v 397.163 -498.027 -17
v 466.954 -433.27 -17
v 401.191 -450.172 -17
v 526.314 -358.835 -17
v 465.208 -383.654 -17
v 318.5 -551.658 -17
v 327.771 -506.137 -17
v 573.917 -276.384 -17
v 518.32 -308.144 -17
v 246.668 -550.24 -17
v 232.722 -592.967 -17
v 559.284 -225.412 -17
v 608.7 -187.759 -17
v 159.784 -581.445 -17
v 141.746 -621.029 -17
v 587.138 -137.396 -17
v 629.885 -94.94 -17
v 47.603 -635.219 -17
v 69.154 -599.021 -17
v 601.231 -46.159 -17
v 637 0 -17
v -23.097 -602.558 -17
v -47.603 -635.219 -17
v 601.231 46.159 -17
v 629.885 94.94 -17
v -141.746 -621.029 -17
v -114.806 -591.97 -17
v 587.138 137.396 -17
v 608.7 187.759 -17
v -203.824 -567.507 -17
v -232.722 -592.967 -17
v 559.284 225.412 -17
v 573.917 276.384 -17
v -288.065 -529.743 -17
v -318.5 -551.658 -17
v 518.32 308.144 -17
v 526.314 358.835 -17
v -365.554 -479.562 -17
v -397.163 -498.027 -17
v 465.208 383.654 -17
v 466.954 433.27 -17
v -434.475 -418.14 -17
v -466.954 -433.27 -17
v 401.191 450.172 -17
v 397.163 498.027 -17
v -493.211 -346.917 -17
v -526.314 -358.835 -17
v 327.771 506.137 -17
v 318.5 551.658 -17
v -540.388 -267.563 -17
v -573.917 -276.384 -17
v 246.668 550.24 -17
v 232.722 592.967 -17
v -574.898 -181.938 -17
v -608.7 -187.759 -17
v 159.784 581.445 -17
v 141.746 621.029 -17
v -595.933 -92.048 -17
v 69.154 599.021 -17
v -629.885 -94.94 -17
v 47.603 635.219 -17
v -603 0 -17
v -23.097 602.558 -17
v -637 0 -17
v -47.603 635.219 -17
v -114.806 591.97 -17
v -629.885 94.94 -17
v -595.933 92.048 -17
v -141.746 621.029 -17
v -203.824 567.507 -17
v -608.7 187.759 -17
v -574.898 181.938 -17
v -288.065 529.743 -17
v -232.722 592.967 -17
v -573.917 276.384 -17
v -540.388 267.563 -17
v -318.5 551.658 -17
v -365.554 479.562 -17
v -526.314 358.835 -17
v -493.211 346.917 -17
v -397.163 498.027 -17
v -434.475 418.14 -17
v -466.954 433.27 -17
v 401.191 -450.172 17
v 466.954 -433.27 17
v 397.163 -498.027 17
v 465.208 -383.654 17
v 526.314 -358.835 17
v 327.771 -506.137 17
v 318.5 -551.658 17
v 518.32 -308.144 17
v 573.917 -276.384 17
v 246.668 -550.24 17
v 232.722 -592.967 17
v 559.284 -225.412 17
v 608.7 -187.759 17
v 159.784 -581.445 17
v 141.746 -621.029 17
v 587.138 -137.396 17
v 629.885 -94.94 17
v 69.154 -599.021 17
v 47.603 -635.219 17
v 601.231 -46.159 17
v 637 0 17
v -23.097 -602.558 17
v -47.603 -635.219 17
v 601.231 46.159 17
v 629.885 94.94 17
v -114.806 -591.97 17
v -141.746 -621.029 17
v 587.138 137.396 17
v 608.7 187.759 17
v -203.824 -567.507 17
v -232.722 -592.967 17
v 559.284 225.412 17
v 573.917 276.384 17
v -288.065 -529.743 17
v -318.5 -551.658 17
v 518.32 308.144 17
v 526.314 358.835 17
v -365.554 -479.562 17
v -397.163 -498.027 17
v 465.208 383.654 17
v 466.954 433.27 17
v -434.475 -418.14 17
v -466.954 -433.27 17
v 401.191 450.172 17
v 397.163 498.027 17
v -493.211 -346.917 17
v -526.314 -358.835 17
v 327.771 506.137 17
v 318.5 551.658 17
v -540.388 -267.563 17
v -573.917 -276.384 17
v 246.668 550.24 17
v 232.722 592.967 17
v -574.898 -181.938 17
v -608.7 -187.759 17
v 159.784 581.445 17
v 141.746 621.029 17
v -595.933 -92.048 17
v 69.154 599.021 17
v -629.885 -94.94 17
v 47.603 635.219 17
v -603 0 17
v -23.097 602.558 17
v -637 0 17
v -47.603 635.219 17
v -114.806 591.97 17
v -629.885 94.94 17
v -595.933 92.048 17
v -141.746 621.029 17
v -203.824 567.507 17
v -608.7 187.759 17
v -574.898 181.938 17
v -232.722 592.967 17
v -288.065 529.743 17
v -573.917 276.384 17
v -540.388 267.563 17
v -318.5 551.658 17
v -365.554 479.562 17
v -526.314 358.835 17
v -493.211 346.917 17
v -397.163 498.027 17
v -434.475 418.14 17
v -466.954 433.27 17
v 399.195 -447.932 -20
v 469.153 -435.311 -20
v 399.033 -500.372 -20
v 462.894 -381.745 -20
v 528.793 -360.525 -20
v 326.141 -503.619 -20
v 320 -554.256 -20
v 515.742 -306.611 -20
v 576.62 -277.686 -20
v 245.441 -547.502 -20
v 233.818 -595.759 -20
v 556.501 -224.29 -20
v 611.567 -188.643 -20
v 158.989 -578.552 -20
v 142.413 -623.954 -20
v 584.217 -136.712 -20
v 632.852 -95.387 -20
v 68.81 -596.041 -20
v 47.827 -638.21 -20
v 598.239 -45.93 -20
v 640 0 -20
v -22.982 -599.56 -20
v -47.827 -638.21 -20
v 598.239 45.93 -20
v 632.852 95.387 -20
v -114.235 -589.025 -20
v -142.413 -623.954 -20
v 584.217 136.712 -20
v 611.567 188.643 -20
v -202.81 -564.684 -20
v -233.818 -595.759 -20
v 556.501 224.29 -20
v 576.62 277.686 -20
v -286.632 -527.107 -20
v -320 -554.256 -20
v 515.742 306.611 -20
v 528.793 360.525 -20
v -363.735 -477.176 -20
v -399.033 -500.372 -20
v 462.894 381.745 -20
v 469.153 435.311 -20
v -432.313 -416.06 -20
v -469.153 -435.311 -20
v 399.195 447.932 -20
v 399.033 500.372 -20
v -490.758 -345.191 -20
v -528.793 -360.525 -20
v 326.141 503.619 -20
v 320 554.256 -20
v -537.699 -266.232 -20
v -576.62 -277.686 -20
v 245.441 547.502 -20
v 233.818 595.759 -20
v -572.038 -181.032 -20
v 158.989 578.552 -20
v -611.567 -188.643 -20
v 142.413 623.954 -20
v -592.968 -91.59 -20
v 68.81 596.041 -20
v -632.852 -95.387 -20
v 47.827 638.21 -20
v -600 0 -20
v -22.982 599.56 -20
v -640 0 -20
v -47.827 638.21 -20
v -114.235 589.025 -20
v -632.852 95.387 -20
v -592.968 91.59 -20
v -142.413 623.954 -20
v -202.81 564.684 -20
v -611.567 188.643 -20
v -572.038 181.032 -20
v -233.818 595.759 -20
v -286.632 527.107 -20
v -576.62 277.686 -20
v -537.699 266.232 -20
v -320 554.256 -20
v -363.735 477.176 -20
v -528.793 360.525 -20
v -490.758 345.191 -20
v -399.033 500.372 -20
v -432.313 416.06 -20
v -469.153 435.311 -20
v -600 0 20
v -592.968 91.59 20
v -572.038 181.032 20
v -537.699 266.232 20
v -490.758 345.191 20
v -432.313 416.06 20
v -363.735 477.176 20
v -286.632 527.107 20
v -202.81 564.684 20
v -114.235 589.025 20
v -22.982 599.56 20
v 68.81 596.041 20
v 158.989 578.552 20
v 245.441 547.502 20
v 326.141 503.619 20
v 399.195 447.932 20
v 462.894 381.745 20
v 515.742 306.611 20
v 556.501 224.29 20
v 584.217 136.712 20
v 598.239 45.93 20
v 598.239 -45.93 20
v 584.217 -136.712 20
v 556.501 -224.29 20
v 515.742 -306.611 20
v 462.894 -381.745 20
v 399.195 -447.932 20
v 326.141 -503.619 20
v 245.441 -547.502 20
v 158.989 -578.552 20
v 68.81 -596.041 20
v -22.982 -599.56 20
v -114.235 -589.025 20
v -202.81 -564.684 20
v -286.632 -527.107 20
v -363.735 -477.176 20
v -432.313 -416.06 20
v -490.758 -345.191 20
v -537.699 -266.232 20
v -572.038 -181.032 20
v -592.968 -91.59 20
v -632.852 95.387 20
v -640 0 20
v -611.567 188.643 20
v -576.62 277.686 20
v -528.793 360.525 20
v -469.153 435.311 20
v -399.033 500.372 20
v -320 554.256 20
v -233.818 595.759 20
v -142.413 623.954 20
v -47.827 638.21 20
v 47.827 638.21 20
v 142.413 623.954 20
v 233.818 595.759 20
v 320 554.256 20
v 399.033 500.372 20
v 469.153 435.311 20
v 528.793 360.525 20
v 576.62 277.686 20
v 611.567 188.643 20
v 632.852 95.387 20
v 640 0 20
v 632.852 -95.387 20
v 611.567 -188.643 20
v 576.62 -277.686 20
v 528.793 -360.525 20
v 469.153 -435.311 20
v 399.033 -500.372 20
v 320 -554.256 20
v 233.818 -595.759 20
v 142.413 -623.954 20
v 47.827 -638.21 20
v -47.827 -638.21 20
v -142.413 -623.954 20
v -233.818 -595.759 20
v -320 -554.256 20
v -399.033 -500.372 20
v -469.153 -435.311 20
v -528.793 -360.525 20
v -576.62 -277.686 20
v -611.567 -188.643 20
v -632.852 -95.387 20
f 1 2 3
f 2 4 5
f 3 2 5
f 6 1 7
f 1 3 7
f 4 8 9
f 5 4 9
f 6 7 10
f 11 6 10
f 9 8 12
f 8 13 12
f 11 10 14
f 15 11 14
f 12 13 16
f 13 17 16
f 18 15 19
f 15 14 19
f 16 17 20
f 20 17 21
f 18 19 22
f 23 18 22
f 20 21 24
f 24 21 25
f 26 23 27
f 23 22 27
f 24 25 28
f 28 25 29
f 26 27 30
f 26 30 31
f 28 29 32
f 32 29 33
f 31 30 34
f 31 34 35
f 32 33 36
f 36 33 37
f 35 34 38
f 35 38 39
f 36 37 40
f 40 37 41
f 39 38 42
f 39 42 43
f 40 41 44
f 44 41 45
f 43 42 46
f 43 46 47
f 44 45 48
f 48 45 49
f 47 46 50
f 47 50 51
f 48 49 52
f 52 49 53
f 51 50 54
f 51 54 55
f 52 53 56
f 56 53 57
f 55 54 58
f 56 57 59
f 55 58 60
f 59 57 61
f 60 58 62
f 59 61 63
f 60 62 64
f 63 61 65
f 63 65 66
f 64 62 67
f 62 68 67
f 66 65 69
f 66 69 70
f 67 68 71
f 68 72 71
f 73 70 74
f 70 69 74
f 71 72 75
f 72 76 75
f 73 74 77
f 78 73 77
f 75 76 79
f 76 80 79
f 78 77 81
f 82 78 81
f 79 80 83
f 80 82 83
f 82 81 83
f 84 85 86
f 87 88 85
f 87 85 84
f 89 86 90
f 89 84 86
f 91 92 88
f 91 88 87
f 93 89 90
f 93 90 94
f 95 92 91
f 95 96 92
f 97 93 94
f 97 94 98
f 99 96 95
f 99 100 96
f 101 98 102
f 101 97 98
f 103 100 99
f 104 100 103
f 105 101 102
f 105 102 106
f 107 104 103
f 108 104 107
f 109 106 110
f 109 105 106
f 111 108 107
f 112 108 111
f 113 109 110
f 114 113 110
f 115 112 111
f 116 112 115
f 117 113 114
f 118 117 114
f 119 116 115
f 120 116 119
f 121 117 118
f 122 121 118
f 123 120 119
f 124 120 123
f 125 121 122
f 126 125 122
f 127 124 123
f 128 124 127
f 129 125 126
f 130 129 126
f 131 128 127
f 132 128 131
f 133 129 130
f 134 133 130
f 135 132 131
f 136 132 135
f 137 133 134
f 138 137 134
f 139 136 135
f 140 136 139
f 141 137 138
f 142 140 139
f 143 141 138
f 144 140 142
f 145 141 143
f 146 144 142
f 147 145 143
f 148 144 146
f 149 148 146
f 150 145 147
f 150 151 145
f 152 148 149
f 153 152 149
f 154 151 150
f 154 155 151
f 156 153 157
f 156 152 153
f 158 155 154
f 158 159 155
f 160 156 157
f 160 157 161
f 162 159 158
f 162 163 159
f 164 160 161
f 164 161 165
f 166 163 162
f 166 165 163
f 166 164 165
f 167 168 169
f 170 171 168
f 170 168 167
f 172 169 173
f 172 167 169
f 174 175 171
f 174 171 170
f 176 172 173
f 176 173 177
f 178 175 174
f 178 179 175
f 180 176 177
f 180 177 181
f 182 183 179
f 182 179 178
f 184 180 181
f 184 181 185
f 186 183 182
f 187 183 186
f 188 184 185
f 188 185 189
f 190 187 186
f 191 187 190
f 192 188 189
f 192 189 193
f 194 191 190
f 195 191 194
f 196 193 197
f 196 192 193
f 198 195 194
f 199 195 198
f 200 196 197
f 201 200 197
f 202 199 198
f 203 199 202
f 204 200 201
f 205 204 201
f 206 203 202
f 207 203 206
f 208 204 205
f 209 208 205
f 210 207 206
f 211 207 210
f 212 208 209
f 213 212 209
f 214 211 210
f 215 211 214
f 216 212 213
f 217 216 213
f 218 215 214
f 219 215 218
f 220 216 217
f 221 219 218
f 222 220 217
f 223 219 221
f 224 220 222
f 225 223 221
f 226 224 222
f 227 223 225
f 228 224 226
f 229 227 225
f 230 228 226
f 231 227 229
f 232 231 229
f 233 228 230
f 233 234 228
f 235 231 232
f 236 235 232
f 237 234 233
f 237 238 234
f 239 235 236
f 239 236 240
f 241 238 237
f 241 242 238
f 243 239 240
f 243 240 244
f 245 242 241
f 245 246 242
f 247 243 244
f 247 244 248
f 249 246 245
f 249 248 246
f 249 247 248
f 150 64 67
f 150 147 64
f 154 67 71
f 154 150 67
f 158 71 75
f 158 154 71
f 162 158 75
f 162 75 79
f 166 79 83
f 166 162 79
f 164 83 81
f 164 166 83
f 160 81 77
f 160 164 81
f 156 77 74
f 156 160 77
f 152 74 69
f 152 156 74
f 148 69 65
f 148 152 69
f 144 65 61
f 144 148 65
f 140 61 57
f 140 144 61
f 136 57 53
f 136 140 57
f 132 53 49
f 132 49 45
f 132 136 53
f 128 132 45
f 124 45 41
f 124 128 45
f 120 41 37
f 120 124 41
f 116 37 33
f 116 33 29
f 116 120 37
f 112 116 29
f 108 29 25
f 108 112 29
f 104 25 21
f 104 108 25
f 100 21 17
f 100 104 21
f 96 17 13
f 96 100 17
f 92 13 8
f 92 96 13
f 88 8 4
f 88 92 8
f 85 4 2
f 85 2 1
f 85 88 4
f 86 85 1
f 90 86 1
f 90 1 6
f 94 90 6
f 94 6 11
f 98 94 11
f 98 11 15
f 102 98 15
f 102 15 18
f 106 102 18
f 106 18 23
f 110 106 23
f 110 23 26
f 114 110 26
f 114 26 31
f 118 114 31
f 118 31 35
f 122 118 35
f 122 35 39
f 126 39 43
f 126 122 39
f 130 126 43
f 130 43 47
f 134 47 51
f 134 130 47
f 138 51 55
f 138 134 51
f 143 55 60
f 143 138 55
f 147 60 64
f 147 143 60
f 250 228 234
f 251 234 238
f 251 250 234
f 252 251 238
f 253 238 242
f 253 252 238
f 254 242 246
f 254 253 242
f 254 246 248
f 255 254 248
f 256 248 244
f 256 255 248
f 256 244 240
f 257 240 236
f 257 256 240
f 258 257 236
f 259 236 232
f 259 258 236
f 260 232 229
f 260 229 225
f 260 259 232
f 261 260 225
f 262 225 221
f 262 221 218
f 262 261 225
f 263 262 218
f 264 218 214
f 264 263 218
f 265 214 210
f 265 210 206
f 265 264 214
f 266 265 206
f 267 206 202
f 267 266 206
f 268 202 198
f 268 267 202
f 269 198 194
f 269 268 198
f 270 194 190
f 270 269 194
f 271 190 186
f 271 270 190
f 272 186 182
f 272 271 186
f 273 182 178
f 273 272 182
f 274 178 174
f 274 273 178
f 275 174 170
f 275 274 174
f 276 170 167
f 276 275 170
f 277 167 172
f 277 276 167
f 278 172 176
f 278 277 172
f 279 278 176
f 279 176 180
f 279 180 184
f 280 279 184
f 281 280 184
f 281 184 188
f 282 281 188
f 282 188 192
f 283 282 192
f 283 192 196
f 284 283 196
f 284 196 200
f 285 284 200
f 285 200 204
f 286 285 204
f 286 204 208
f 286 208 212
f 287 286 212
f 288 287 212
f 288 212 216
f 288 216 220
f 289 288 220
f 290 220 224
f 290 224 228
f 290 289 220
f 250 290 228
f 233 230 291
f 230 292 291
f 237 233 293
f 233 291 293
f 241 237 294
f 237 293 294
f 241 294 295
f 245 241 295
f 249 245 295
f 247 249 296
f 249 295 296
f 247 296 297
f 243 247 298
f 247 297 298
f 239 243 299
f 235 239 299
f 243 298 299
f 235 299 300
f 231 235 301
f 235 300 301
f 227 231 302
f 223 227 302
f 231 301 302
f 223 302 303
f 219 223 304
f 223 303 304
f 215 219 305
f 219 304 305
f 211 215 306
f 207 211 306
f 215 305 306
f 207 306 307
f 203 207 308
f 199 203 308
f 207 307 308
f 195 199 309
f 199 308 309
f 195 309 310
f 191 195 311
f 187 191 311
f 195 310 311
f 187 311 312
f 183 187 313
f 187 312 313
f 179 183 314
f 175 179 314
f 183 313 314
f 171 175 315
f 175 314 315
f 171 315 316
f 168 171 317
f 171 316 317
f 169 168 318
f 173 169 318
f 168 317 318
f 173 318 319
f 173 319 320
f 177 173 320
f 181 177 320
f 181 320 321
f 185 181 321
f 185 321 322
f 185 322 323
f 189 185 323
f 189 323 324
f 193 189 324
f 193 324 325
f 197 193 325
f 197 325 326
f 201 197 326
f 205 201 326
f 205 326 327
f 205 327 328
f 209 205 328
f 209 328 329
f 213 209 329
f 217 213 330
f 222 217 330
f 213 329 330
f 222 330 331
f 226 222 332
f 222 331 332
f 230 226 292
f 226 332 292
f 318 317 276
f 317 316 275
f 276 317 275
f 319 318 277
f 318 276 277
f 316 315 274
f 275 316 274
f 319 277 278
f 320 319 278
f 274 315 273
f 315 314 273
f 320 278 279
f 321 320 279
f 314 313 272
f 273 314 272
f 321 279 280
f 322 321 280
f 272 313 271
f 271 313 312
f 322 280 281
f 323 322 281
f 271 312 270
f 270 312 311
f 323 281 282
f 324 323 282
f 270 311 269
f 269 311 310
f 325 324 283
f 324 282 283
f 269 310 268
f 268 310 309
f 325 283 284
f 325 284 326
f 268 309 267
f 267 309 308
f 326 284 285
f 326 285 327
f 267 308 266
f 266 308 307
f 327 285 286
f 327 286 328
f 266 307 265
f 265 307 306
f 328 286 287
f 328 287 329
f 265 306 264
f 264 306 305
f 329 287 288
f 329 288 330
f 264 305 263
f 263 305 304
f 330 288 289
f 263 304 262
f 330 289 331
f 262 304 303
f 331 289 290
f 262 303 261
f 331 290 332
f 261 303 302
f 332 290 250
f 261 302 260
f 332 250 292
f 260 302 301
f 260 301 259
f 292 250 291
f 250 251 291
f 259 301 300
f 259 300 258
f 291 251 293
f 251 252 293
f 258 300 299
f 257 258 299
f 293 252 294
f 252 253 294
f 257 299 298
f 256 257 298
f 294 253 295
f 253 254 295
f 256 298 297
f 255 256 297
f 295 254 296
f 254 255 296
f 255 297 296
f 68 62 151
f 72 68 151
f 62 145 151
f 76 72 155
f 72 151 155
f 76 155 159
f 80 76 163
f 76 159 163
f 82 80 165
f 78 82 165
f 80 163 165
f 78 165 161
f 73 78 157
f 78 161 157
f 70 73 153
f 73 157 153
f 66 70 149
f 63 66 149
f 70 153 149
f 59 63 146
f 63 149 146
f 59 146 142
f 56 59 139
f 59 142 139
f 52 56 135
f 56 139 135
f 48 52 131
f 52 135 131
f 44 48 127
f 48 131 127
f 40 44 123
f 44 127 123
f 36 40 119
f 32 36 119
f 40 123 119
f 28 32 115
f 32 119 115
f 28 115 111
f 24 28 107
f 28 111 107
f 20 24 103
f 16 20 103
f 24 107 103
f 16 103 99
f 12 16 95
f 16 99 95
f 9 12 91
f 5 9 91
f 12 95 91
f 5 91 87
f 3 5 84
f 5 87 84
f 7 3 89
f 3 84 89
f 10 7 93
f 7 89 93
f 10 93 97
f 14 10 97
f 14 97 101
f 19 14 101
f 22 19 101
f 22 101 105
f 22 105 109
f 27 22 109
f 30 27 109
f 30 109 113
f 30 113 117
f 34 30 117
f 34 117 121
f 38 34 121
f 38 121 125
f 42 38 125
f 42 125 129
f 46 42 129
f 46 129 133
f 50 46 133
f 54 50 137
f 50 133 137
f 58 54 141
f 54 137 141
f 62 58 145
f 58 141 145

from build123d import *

# Parameters (mm, degrees)
F0_W   = 40
F0_H   = 40
F0_W_2 = 34
F0_H_2 = 34


with BuildPart() as f1:
    # F0 (on Front) → F1 (revolve)
    with BuildSketch(Plane.XZ):
        with Locations((-620, 0)):
            Rectangle(F0_W, F0_H)
        with Locations((-620, 0)):
            Rectangle(F0_W_2, F0_H_2, mode=Mode.SUBTRACT)
    revolve(axis=Axis((0, 0, -37.583534), (0, 0, -1)))


solid = f1.part
